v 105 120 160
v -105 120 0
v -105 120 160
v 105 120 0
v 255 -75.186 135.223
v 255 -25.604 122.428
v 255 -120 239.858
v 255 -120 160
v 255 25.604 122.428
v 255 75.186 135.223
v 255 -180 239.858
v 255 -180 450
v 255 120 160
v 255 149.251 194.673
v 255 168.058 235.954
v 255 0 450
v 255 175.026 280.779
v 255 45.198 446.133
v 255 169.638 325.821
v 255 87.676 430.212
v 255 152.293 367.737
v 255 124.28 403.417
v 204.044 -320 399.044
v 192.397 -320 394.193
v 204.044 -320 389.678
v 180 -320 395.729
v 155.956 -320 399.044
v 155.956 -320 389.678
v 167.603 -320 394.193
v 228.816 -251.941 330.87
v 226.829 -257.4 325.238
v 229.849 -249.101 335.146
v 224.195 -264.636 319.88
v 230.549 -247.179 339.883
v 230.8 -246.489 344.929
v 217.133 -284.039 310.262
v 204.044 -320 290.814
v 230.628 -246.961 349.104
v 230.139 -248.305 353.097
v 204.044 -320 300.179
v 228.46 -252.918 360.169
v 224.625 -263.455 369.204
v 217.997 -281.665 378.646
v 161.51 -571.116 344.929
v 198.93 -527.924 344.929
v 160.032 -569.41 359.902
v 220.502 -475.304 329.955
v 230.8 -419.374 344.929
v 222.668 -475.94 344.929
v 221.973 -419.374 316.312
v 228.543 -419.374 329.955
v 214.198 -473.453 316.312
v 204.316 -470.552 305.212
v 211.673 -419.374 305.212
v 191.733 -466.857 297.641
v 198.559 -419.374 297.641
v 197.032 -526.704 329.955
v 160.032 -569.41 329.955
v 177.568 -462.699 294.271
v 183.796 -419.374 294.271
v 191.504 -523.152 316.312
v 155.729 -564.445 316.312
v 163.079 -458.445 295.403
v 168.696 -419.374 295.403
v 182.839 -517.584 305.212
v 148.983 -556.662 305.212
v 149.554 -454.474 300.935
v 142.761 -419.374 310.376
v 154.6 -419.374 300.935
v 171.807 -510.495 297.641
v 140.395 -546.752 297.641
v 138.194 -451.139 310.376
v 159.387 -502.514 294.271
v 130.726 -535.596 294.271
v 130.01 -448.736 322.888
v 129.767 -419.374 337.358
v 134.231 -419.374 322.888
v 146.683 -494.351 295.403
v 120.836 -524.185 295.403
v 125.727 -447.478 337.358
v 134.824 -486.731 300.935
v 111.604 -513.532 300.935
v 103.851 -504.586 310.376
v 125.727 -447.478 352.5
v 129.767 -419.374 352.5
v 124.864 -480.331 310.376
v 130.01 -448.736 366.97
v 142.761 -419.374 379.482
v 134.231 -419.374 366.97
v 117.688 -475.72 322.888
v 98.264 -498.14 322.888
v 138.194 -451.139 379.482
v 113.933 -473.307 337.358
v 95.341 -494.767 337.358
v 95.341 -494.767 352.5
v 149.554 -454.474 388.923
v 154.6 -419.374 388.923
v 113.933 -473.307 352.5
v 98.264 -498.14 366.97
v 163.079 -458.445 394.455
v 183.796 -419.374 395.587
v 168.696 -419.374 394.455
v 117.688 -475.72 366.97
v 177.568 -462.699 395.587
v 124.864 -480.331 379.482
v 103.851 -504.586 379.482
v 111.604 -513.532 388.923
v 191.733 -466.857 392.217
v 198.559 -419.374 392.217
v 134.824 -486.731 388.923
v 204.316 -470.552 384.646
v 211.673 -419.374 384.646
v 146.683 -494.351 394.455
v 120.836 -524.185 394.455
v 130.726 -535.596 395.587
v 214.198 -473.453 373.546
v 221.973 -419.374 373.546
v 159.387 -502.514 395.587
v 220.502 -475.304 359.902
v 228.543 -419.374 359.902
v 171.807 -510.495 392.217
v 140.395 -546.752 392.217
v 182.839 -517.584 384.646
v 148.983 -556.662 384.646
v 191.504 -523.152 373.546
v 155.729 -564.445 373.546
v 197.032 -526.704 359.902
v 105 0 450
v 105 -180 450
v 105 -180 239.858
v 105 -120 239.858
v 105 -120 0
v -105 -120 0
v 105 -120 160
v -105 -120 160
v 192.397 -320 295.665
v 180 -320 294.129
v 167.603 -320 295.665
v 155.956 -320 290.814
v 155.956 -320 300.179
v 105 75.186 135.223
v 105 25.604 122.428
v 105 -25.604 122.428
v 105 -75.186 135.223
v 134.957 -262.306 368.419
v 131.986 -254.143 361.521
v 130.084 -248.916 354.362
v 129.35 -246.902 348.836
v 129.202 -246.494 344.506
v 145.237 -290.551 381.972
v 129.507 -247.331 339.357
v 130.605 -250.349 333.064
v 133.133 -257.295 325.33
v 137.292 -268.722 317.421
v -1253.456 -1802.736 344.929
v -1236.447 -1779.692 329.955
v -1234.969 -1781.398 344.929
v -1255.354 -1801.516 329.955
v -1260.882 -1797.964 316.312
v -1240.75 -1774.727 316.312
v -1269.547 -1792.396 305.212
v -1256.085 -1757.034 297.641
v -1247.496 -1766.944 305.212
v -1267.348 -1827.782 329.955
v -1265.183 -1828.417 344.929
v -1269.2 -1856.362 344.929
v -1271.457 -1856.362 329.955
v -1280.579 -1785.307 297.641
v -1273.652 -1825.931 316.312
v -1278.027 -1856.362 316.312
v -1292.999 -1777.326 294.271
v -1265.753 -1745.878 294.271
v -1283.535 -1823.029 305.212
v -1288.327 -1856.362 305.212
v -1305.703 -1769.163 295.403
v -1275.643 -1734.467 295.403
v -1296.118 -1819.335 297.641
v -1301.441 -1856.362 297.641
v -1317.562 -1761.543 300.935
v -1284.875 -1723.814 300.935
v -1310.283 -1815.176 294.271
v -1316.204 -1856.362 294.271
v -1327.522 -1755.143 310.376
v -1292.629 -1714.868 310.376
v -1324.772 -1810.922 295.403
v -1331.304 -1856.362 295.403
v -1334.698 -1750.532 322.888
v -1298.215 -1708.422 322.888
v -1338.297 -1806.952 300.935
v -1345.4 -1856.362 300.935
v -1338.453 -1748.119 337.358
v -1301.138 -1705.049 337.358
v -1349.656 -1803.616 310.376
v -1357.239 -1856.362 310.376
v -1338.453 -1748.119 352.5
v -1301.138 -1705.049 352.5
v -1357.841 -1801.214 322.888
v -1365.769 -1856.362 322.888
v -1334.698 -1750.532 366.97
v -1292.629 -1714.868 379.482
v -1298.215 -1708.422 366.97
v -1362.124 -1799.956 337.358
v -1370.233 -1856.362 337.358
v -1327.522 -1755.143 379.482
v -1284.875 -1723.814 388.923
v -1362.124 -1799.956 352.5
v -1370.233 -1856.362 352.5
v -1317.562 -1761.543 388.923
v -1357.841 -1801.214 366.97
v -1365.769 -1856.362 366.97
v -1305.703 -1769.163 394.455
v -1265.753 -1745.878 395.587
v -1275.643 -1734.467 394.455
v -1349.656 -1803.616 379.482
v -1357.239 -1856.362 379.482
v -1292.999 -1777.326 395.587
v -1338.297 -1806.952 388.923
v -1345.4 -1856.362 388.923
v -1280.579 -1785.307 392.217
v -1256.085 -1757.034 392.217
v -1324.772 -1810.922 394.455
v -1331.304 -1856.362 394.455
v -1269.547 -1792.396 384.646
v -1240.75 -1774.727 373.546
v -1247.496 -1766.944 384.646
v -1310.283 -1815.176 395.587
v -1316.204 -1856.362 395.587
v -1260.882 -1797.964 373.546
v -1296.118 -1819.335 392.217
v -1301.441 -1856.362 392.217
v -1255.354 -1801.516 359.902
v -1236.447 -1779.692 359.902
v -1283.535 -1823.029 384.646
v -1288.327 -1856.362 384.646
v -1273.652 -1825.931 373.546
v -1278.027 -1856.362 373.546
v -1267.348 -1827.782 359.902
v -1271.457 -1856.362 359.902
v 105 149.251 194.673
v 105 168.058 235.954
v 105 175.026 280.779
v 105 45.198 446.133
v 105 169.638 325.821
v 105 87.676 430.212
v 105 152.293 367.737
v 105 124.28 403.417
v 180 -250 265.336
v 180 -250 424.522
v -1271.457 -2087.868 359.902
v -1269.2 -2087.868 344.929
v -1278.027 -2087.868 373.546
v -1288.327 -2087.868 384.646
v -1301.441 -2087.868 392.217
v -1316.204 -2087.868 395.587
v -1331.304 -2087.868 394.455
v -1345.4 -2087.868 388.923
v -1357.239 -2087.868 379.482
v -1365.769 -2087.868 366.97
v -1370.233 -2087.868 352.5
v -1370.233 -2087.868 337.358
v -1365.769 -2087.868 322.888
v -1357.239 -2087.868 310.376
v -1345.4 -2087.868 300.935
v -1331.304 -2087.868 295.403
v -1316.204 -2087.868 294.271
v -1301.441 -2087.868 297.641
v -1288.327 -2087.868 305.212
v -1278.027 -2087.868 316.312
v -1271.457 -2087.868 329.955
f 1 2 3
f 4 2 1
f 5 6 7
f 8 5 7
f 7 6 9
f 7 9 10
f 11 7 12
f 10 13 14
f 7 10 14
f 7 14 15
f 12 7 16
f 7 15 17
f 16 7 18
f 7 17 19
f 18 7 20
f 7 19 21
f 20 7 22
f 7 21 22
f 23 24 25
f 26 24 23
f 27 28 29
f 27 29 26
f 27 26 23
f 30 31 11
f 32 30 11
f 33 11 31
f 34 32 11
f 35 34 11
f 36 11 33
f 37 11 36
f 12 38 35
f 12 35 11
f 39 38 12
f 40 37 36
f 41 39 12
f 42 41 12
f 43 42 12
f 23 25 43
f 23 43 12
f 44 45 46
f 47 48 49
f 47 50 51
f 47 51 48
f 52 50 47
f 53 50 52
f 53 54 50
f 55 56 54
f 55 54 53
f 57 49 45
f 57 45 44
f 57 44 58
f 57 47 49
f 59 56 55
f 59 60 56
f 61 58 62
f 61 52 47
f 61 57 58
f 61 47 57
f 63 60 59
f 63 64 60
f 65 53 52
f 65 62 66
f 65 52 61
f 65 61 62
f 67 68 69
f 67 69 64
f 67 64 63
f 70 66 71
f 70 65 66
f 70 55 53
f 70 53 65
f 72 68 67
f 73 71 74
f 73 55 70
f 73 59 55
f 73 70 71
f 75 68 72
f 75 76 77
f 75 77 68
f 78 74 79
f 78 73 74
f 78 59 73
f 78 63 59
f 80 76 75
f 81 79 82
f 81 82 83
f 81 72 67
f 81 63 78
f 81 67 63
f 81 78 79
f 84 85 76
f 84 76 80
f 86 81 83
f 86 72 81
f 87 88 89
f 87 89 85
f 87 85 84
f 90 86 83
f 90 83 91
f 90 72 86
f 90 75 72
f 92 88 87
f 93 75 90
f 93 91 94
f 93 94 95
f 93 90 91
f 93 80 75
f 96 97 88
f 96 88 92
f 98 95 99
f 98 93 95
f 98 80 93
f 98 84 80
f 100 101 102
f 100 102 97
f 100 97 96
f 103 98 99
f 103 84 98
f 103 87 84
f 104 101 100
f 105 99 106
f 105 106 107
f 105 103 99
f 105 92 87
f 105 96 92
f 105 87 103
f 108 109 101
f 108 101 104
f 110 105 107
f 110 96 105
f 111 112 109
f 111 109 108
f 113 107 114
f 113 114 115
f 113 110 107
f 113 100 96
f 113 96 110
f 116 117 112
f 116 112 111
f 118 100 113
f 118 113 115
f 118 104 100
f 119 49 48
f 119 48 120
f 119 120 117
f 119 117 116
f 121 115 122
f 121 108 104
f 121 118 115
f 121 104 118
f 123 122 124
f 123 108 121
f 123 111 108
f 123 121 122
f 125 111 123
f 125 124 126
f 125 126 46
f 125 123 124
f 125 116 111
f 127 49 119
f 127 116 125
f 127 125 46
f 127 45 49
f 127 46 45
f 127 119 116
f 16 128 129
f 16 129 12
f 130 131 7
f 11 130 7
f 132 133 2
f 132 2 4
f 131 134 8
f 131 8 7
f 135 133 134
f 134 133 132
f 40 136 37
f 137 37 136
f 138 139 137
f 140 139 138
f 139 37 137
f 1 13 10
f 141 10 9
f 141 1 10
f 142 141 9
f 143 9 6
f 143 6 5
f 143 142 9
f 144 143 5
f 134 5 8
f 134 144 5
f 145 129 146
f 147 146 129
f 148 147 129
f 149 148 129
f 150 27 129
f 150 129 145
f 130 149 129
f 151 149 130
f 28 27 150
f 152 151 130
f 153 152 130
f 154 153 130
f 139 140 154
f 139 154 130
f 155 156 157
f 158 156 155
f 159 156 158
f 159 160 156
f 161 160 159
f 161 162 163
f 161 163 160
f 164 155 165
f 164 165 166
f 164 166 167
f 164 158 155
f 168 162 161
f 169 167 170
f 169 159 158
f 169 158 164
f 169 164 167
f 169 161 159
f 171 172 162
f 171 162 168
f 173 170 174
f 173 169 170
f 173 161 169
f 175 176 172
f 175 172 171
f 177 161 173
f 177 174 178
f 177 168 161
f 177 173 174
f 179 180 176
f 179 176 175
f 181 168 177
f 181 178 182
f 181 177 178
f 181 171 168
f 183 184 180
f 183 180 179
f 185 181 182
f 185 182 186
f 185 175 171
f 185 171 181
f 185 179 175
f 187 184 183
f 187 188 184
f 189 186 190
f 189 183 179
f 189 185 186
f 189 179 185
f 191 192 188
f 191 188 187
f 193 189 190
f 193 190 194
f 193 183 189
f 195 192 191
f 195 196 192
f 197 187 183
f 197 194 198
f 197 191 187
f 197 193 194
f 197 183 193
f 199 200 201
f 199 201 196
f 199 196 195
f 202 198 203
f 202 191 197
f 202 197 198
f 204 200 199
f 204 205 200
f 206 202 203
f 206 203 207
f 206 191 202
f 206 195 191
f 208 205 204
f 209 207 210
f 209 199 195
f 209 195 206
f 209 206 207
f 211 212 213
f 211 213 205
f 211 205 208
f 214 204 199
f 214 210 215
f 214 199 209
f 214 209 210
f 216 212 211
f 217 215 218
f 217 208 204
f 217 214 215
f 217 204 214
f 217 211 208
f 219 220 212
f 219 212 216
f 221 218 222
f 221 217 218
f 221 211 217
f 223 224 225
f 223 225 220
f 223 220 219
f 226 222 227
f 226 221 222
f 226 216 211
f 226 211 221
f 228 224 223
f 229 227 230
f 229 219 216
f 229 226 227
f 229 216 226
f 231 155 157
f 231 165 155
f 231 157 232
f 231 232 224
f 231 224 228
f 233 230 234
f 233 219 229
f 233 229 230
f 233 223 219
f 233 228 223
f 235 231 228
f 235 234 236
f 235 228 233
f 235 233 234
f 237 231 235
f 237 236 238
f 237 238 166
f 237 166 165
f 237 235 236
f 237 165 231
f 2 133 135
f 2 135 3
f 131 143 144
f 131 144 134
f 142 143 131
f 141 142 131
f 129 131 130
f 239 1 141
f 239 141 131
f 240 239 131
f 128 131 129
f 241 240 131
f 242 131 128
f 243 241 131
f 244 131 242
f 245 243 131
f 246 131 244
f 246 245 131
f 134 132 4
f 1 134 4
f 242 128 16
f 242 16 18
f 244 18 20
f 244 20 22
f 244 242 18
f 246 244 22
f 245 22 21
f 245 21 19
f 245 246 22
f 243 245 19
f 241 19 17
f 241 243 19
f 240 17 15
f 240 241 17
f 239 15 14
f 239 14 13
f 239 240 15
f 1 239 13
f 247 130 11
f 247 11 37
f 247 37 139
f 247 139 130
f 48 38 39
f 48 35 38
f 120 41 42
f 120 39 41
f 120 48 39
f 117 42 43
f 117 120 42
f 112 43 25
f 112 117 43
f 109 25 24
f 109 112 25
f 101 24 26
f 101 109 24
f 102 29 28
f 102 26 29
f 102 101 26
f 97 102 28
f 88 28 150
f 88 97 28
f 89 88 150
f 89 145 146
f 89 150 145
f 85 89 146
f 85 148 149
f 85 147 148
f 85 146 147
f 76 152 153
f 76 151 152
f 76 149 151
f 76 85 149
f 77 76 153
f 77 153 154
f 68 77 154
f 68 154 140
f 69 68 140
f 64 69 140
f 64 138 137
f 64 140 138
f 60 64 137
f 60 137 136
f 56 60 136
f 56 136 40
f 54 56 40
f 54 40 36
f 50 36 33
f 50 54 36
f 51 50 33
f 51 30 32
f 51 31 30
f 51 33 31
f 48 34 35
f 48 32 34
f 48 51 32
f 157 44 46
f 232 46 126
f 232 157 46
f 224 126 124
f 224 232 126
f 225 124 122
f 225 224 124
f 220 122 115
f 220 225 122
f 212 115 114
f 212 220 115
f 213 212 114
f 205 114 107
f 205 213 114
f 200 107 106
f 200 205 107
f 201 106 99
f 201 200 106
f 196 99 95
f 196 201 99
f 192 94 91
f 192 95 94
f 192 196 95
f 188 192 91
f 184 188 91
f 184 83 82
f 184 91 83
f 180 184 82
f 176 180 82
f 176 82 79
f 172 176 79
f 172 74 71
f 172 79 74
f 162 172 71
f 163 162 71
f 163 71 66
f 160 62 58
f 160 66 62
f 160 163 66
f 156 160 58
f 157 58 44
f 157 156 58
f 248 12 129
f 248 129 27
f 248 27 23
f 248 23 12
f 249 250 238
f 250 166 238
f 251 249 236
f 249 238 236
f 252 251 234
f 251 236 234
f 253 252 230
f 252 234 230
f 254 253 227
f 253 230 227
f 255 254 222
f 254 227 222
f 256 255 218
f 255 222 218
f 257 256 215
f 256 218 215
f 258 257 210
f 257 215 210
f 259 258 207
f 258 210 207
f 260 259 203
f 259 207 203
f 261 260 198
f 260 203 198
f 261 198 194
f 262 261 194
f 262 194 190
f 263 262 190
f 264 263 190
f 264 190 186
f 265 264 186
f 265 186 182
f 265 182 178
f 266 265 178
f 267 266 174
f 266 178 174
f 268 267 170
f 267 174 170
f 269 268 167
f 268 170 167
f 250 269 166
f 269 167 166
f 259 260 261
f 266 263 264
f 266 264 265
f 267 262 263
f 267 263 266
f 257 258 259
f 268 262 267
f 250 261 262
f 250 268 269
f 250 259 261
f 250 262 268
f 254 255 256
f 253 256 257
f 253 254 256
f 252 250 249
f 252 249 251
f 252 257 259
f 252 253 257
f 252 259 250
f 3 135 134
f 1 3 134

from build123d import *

# Parameters (mm, degrees)
CROQUIS1_W              = 210
CROQUIS1_H              = 240
SALIENTE_EXTRUIR1_DEPTH = 160
SALIENTE_EXTRUIR2_DEPTH = 150
CROQUIS3_W              = 150
CROQUIS3_H              = 210.142141412
SALIENTE_EXTRUIR3_DEPTH = 60
CROQUIS4_R              = 50.8
SALIENTE_EXTRUIR4_DEPTH = 170
CROQUIS5_W              = 150
CROQUIS5_H              = 210.142141412
SALIENTE_EXTRUIR5_DEPTH = 140
SALIENTE_EXTRUIR5_TAPER = 20
CROQUIS6_R              = 50.8
CROQUIS7_R              = 50.8
SALIENTE_EXTRUIR6_DEPTH = 100


with BuildPart() as part:
    # Croquis1 → Saliente-Extruir1 (new body)
    with BuildSketch(Plane.XY):
        Rectangle(CROQUIS1_W, CROQUIS1_H)
    extrude(amount=SALIENTE_EXTRUIR1_DEPTH)


with BuildPart() as body_2:
    # Croquis2 → Saliente-Extruir2 (new body)
    with BuildSketch(Plane(origin=(105, 0, 0), x_dir=(0, 0, -1), z_dir=(1, 0, 0))):
        with BuildLine():
            Line((-160, -120), (-450, -120))
            Line((-450, -120), (-450, 0))
            ThreePointArc((-450, 0), (-347.372372038, 162.399899092), (-160, 120))
            ThreePointArc((-160, 120), (-120.80959106, 0), (-160, -120))
        make_face()
    extrude(amount=SALIENTE_EXTRUIR2_DEPTH)

    # Croquis3 → Saliente-Extruir3 (add)
    with BuildSketch(Plane.XZ.offset(120)):
        with Locations((180, 344.928929294)):
            Rectangle(CROQUIS3_W, CROQUIS3_H)
    extrude(amount=SALIENTE_EXTRUIR3_DEPTH)

    # Croquis4 → Saliente-Extruir4 (add)
    with BuildSketch(Plane.XZ.offset(180)):
        with Locations((180, 344.928929294)):
            Circle(CROQUIS4_R)
    extrude(amount=SALIENTE_EXTRUIR4_DEPTH)

    # Croquis5 → Saliente-Extruir5 (add)
    with BuildSketch(Plane.XZ.offset(180)):
        with Locations((180, 344.928929294)):
            Rectangle(CROQUIS5_W, CROQUIS5_H)
    extrude(amount=SALIENTE_EXTRUIR5_DEPTH, taper=SALIENTE_EXTRUIR5_TAPER)

    # Barrer1: sweep along a curve in space
    with BuildLine() as barrer1_path:
        Line((180, -350, 344.928929294), (180, -419.373633231, 344.928929294))
        ThreePointArc((180, -419.373633231, 344.928929294), (166.447676995, -481.679583531, 344.928929294), (128.239580763, -532.72699565, 344.928929294))
        Line((-1268.239580763, -1743.008935638, 344.928929294), (128.239580763, -532.72699565, 344.928929294))
        ThreePointArc((-1320, -1856.362298057, 344.928929294), (-1306.447676995, -1794.056347757, 344.928929294), (-1268.239580763, -1743.008935638, 344.928929294))
        Line((-1320, -1987.867965644, 344.928929294), (-1320, -1856.362298057, 344.928929294))
    # Croquis6 → Barrer1 (sweep)
    with BuildSketch(Plane.XZ.offset(350)):
        with Locations((180, 344.928929294)):
            Circle(CROQUIS6_R)
    sweep(path=barrer1_path.line)

    # Croquis7 → Saliente-Extruir6 (add)
    with BuildSketch(Plane.XZ.offset(1987.867965644)):
        with Locations((-1320, 344.928929294)):
            Circle(CROQUIS7_R)
    extrude(amount=SALIENTE_EXTRUIR6_DEPTH)


solid = Compound([part.part, body_2.part])
